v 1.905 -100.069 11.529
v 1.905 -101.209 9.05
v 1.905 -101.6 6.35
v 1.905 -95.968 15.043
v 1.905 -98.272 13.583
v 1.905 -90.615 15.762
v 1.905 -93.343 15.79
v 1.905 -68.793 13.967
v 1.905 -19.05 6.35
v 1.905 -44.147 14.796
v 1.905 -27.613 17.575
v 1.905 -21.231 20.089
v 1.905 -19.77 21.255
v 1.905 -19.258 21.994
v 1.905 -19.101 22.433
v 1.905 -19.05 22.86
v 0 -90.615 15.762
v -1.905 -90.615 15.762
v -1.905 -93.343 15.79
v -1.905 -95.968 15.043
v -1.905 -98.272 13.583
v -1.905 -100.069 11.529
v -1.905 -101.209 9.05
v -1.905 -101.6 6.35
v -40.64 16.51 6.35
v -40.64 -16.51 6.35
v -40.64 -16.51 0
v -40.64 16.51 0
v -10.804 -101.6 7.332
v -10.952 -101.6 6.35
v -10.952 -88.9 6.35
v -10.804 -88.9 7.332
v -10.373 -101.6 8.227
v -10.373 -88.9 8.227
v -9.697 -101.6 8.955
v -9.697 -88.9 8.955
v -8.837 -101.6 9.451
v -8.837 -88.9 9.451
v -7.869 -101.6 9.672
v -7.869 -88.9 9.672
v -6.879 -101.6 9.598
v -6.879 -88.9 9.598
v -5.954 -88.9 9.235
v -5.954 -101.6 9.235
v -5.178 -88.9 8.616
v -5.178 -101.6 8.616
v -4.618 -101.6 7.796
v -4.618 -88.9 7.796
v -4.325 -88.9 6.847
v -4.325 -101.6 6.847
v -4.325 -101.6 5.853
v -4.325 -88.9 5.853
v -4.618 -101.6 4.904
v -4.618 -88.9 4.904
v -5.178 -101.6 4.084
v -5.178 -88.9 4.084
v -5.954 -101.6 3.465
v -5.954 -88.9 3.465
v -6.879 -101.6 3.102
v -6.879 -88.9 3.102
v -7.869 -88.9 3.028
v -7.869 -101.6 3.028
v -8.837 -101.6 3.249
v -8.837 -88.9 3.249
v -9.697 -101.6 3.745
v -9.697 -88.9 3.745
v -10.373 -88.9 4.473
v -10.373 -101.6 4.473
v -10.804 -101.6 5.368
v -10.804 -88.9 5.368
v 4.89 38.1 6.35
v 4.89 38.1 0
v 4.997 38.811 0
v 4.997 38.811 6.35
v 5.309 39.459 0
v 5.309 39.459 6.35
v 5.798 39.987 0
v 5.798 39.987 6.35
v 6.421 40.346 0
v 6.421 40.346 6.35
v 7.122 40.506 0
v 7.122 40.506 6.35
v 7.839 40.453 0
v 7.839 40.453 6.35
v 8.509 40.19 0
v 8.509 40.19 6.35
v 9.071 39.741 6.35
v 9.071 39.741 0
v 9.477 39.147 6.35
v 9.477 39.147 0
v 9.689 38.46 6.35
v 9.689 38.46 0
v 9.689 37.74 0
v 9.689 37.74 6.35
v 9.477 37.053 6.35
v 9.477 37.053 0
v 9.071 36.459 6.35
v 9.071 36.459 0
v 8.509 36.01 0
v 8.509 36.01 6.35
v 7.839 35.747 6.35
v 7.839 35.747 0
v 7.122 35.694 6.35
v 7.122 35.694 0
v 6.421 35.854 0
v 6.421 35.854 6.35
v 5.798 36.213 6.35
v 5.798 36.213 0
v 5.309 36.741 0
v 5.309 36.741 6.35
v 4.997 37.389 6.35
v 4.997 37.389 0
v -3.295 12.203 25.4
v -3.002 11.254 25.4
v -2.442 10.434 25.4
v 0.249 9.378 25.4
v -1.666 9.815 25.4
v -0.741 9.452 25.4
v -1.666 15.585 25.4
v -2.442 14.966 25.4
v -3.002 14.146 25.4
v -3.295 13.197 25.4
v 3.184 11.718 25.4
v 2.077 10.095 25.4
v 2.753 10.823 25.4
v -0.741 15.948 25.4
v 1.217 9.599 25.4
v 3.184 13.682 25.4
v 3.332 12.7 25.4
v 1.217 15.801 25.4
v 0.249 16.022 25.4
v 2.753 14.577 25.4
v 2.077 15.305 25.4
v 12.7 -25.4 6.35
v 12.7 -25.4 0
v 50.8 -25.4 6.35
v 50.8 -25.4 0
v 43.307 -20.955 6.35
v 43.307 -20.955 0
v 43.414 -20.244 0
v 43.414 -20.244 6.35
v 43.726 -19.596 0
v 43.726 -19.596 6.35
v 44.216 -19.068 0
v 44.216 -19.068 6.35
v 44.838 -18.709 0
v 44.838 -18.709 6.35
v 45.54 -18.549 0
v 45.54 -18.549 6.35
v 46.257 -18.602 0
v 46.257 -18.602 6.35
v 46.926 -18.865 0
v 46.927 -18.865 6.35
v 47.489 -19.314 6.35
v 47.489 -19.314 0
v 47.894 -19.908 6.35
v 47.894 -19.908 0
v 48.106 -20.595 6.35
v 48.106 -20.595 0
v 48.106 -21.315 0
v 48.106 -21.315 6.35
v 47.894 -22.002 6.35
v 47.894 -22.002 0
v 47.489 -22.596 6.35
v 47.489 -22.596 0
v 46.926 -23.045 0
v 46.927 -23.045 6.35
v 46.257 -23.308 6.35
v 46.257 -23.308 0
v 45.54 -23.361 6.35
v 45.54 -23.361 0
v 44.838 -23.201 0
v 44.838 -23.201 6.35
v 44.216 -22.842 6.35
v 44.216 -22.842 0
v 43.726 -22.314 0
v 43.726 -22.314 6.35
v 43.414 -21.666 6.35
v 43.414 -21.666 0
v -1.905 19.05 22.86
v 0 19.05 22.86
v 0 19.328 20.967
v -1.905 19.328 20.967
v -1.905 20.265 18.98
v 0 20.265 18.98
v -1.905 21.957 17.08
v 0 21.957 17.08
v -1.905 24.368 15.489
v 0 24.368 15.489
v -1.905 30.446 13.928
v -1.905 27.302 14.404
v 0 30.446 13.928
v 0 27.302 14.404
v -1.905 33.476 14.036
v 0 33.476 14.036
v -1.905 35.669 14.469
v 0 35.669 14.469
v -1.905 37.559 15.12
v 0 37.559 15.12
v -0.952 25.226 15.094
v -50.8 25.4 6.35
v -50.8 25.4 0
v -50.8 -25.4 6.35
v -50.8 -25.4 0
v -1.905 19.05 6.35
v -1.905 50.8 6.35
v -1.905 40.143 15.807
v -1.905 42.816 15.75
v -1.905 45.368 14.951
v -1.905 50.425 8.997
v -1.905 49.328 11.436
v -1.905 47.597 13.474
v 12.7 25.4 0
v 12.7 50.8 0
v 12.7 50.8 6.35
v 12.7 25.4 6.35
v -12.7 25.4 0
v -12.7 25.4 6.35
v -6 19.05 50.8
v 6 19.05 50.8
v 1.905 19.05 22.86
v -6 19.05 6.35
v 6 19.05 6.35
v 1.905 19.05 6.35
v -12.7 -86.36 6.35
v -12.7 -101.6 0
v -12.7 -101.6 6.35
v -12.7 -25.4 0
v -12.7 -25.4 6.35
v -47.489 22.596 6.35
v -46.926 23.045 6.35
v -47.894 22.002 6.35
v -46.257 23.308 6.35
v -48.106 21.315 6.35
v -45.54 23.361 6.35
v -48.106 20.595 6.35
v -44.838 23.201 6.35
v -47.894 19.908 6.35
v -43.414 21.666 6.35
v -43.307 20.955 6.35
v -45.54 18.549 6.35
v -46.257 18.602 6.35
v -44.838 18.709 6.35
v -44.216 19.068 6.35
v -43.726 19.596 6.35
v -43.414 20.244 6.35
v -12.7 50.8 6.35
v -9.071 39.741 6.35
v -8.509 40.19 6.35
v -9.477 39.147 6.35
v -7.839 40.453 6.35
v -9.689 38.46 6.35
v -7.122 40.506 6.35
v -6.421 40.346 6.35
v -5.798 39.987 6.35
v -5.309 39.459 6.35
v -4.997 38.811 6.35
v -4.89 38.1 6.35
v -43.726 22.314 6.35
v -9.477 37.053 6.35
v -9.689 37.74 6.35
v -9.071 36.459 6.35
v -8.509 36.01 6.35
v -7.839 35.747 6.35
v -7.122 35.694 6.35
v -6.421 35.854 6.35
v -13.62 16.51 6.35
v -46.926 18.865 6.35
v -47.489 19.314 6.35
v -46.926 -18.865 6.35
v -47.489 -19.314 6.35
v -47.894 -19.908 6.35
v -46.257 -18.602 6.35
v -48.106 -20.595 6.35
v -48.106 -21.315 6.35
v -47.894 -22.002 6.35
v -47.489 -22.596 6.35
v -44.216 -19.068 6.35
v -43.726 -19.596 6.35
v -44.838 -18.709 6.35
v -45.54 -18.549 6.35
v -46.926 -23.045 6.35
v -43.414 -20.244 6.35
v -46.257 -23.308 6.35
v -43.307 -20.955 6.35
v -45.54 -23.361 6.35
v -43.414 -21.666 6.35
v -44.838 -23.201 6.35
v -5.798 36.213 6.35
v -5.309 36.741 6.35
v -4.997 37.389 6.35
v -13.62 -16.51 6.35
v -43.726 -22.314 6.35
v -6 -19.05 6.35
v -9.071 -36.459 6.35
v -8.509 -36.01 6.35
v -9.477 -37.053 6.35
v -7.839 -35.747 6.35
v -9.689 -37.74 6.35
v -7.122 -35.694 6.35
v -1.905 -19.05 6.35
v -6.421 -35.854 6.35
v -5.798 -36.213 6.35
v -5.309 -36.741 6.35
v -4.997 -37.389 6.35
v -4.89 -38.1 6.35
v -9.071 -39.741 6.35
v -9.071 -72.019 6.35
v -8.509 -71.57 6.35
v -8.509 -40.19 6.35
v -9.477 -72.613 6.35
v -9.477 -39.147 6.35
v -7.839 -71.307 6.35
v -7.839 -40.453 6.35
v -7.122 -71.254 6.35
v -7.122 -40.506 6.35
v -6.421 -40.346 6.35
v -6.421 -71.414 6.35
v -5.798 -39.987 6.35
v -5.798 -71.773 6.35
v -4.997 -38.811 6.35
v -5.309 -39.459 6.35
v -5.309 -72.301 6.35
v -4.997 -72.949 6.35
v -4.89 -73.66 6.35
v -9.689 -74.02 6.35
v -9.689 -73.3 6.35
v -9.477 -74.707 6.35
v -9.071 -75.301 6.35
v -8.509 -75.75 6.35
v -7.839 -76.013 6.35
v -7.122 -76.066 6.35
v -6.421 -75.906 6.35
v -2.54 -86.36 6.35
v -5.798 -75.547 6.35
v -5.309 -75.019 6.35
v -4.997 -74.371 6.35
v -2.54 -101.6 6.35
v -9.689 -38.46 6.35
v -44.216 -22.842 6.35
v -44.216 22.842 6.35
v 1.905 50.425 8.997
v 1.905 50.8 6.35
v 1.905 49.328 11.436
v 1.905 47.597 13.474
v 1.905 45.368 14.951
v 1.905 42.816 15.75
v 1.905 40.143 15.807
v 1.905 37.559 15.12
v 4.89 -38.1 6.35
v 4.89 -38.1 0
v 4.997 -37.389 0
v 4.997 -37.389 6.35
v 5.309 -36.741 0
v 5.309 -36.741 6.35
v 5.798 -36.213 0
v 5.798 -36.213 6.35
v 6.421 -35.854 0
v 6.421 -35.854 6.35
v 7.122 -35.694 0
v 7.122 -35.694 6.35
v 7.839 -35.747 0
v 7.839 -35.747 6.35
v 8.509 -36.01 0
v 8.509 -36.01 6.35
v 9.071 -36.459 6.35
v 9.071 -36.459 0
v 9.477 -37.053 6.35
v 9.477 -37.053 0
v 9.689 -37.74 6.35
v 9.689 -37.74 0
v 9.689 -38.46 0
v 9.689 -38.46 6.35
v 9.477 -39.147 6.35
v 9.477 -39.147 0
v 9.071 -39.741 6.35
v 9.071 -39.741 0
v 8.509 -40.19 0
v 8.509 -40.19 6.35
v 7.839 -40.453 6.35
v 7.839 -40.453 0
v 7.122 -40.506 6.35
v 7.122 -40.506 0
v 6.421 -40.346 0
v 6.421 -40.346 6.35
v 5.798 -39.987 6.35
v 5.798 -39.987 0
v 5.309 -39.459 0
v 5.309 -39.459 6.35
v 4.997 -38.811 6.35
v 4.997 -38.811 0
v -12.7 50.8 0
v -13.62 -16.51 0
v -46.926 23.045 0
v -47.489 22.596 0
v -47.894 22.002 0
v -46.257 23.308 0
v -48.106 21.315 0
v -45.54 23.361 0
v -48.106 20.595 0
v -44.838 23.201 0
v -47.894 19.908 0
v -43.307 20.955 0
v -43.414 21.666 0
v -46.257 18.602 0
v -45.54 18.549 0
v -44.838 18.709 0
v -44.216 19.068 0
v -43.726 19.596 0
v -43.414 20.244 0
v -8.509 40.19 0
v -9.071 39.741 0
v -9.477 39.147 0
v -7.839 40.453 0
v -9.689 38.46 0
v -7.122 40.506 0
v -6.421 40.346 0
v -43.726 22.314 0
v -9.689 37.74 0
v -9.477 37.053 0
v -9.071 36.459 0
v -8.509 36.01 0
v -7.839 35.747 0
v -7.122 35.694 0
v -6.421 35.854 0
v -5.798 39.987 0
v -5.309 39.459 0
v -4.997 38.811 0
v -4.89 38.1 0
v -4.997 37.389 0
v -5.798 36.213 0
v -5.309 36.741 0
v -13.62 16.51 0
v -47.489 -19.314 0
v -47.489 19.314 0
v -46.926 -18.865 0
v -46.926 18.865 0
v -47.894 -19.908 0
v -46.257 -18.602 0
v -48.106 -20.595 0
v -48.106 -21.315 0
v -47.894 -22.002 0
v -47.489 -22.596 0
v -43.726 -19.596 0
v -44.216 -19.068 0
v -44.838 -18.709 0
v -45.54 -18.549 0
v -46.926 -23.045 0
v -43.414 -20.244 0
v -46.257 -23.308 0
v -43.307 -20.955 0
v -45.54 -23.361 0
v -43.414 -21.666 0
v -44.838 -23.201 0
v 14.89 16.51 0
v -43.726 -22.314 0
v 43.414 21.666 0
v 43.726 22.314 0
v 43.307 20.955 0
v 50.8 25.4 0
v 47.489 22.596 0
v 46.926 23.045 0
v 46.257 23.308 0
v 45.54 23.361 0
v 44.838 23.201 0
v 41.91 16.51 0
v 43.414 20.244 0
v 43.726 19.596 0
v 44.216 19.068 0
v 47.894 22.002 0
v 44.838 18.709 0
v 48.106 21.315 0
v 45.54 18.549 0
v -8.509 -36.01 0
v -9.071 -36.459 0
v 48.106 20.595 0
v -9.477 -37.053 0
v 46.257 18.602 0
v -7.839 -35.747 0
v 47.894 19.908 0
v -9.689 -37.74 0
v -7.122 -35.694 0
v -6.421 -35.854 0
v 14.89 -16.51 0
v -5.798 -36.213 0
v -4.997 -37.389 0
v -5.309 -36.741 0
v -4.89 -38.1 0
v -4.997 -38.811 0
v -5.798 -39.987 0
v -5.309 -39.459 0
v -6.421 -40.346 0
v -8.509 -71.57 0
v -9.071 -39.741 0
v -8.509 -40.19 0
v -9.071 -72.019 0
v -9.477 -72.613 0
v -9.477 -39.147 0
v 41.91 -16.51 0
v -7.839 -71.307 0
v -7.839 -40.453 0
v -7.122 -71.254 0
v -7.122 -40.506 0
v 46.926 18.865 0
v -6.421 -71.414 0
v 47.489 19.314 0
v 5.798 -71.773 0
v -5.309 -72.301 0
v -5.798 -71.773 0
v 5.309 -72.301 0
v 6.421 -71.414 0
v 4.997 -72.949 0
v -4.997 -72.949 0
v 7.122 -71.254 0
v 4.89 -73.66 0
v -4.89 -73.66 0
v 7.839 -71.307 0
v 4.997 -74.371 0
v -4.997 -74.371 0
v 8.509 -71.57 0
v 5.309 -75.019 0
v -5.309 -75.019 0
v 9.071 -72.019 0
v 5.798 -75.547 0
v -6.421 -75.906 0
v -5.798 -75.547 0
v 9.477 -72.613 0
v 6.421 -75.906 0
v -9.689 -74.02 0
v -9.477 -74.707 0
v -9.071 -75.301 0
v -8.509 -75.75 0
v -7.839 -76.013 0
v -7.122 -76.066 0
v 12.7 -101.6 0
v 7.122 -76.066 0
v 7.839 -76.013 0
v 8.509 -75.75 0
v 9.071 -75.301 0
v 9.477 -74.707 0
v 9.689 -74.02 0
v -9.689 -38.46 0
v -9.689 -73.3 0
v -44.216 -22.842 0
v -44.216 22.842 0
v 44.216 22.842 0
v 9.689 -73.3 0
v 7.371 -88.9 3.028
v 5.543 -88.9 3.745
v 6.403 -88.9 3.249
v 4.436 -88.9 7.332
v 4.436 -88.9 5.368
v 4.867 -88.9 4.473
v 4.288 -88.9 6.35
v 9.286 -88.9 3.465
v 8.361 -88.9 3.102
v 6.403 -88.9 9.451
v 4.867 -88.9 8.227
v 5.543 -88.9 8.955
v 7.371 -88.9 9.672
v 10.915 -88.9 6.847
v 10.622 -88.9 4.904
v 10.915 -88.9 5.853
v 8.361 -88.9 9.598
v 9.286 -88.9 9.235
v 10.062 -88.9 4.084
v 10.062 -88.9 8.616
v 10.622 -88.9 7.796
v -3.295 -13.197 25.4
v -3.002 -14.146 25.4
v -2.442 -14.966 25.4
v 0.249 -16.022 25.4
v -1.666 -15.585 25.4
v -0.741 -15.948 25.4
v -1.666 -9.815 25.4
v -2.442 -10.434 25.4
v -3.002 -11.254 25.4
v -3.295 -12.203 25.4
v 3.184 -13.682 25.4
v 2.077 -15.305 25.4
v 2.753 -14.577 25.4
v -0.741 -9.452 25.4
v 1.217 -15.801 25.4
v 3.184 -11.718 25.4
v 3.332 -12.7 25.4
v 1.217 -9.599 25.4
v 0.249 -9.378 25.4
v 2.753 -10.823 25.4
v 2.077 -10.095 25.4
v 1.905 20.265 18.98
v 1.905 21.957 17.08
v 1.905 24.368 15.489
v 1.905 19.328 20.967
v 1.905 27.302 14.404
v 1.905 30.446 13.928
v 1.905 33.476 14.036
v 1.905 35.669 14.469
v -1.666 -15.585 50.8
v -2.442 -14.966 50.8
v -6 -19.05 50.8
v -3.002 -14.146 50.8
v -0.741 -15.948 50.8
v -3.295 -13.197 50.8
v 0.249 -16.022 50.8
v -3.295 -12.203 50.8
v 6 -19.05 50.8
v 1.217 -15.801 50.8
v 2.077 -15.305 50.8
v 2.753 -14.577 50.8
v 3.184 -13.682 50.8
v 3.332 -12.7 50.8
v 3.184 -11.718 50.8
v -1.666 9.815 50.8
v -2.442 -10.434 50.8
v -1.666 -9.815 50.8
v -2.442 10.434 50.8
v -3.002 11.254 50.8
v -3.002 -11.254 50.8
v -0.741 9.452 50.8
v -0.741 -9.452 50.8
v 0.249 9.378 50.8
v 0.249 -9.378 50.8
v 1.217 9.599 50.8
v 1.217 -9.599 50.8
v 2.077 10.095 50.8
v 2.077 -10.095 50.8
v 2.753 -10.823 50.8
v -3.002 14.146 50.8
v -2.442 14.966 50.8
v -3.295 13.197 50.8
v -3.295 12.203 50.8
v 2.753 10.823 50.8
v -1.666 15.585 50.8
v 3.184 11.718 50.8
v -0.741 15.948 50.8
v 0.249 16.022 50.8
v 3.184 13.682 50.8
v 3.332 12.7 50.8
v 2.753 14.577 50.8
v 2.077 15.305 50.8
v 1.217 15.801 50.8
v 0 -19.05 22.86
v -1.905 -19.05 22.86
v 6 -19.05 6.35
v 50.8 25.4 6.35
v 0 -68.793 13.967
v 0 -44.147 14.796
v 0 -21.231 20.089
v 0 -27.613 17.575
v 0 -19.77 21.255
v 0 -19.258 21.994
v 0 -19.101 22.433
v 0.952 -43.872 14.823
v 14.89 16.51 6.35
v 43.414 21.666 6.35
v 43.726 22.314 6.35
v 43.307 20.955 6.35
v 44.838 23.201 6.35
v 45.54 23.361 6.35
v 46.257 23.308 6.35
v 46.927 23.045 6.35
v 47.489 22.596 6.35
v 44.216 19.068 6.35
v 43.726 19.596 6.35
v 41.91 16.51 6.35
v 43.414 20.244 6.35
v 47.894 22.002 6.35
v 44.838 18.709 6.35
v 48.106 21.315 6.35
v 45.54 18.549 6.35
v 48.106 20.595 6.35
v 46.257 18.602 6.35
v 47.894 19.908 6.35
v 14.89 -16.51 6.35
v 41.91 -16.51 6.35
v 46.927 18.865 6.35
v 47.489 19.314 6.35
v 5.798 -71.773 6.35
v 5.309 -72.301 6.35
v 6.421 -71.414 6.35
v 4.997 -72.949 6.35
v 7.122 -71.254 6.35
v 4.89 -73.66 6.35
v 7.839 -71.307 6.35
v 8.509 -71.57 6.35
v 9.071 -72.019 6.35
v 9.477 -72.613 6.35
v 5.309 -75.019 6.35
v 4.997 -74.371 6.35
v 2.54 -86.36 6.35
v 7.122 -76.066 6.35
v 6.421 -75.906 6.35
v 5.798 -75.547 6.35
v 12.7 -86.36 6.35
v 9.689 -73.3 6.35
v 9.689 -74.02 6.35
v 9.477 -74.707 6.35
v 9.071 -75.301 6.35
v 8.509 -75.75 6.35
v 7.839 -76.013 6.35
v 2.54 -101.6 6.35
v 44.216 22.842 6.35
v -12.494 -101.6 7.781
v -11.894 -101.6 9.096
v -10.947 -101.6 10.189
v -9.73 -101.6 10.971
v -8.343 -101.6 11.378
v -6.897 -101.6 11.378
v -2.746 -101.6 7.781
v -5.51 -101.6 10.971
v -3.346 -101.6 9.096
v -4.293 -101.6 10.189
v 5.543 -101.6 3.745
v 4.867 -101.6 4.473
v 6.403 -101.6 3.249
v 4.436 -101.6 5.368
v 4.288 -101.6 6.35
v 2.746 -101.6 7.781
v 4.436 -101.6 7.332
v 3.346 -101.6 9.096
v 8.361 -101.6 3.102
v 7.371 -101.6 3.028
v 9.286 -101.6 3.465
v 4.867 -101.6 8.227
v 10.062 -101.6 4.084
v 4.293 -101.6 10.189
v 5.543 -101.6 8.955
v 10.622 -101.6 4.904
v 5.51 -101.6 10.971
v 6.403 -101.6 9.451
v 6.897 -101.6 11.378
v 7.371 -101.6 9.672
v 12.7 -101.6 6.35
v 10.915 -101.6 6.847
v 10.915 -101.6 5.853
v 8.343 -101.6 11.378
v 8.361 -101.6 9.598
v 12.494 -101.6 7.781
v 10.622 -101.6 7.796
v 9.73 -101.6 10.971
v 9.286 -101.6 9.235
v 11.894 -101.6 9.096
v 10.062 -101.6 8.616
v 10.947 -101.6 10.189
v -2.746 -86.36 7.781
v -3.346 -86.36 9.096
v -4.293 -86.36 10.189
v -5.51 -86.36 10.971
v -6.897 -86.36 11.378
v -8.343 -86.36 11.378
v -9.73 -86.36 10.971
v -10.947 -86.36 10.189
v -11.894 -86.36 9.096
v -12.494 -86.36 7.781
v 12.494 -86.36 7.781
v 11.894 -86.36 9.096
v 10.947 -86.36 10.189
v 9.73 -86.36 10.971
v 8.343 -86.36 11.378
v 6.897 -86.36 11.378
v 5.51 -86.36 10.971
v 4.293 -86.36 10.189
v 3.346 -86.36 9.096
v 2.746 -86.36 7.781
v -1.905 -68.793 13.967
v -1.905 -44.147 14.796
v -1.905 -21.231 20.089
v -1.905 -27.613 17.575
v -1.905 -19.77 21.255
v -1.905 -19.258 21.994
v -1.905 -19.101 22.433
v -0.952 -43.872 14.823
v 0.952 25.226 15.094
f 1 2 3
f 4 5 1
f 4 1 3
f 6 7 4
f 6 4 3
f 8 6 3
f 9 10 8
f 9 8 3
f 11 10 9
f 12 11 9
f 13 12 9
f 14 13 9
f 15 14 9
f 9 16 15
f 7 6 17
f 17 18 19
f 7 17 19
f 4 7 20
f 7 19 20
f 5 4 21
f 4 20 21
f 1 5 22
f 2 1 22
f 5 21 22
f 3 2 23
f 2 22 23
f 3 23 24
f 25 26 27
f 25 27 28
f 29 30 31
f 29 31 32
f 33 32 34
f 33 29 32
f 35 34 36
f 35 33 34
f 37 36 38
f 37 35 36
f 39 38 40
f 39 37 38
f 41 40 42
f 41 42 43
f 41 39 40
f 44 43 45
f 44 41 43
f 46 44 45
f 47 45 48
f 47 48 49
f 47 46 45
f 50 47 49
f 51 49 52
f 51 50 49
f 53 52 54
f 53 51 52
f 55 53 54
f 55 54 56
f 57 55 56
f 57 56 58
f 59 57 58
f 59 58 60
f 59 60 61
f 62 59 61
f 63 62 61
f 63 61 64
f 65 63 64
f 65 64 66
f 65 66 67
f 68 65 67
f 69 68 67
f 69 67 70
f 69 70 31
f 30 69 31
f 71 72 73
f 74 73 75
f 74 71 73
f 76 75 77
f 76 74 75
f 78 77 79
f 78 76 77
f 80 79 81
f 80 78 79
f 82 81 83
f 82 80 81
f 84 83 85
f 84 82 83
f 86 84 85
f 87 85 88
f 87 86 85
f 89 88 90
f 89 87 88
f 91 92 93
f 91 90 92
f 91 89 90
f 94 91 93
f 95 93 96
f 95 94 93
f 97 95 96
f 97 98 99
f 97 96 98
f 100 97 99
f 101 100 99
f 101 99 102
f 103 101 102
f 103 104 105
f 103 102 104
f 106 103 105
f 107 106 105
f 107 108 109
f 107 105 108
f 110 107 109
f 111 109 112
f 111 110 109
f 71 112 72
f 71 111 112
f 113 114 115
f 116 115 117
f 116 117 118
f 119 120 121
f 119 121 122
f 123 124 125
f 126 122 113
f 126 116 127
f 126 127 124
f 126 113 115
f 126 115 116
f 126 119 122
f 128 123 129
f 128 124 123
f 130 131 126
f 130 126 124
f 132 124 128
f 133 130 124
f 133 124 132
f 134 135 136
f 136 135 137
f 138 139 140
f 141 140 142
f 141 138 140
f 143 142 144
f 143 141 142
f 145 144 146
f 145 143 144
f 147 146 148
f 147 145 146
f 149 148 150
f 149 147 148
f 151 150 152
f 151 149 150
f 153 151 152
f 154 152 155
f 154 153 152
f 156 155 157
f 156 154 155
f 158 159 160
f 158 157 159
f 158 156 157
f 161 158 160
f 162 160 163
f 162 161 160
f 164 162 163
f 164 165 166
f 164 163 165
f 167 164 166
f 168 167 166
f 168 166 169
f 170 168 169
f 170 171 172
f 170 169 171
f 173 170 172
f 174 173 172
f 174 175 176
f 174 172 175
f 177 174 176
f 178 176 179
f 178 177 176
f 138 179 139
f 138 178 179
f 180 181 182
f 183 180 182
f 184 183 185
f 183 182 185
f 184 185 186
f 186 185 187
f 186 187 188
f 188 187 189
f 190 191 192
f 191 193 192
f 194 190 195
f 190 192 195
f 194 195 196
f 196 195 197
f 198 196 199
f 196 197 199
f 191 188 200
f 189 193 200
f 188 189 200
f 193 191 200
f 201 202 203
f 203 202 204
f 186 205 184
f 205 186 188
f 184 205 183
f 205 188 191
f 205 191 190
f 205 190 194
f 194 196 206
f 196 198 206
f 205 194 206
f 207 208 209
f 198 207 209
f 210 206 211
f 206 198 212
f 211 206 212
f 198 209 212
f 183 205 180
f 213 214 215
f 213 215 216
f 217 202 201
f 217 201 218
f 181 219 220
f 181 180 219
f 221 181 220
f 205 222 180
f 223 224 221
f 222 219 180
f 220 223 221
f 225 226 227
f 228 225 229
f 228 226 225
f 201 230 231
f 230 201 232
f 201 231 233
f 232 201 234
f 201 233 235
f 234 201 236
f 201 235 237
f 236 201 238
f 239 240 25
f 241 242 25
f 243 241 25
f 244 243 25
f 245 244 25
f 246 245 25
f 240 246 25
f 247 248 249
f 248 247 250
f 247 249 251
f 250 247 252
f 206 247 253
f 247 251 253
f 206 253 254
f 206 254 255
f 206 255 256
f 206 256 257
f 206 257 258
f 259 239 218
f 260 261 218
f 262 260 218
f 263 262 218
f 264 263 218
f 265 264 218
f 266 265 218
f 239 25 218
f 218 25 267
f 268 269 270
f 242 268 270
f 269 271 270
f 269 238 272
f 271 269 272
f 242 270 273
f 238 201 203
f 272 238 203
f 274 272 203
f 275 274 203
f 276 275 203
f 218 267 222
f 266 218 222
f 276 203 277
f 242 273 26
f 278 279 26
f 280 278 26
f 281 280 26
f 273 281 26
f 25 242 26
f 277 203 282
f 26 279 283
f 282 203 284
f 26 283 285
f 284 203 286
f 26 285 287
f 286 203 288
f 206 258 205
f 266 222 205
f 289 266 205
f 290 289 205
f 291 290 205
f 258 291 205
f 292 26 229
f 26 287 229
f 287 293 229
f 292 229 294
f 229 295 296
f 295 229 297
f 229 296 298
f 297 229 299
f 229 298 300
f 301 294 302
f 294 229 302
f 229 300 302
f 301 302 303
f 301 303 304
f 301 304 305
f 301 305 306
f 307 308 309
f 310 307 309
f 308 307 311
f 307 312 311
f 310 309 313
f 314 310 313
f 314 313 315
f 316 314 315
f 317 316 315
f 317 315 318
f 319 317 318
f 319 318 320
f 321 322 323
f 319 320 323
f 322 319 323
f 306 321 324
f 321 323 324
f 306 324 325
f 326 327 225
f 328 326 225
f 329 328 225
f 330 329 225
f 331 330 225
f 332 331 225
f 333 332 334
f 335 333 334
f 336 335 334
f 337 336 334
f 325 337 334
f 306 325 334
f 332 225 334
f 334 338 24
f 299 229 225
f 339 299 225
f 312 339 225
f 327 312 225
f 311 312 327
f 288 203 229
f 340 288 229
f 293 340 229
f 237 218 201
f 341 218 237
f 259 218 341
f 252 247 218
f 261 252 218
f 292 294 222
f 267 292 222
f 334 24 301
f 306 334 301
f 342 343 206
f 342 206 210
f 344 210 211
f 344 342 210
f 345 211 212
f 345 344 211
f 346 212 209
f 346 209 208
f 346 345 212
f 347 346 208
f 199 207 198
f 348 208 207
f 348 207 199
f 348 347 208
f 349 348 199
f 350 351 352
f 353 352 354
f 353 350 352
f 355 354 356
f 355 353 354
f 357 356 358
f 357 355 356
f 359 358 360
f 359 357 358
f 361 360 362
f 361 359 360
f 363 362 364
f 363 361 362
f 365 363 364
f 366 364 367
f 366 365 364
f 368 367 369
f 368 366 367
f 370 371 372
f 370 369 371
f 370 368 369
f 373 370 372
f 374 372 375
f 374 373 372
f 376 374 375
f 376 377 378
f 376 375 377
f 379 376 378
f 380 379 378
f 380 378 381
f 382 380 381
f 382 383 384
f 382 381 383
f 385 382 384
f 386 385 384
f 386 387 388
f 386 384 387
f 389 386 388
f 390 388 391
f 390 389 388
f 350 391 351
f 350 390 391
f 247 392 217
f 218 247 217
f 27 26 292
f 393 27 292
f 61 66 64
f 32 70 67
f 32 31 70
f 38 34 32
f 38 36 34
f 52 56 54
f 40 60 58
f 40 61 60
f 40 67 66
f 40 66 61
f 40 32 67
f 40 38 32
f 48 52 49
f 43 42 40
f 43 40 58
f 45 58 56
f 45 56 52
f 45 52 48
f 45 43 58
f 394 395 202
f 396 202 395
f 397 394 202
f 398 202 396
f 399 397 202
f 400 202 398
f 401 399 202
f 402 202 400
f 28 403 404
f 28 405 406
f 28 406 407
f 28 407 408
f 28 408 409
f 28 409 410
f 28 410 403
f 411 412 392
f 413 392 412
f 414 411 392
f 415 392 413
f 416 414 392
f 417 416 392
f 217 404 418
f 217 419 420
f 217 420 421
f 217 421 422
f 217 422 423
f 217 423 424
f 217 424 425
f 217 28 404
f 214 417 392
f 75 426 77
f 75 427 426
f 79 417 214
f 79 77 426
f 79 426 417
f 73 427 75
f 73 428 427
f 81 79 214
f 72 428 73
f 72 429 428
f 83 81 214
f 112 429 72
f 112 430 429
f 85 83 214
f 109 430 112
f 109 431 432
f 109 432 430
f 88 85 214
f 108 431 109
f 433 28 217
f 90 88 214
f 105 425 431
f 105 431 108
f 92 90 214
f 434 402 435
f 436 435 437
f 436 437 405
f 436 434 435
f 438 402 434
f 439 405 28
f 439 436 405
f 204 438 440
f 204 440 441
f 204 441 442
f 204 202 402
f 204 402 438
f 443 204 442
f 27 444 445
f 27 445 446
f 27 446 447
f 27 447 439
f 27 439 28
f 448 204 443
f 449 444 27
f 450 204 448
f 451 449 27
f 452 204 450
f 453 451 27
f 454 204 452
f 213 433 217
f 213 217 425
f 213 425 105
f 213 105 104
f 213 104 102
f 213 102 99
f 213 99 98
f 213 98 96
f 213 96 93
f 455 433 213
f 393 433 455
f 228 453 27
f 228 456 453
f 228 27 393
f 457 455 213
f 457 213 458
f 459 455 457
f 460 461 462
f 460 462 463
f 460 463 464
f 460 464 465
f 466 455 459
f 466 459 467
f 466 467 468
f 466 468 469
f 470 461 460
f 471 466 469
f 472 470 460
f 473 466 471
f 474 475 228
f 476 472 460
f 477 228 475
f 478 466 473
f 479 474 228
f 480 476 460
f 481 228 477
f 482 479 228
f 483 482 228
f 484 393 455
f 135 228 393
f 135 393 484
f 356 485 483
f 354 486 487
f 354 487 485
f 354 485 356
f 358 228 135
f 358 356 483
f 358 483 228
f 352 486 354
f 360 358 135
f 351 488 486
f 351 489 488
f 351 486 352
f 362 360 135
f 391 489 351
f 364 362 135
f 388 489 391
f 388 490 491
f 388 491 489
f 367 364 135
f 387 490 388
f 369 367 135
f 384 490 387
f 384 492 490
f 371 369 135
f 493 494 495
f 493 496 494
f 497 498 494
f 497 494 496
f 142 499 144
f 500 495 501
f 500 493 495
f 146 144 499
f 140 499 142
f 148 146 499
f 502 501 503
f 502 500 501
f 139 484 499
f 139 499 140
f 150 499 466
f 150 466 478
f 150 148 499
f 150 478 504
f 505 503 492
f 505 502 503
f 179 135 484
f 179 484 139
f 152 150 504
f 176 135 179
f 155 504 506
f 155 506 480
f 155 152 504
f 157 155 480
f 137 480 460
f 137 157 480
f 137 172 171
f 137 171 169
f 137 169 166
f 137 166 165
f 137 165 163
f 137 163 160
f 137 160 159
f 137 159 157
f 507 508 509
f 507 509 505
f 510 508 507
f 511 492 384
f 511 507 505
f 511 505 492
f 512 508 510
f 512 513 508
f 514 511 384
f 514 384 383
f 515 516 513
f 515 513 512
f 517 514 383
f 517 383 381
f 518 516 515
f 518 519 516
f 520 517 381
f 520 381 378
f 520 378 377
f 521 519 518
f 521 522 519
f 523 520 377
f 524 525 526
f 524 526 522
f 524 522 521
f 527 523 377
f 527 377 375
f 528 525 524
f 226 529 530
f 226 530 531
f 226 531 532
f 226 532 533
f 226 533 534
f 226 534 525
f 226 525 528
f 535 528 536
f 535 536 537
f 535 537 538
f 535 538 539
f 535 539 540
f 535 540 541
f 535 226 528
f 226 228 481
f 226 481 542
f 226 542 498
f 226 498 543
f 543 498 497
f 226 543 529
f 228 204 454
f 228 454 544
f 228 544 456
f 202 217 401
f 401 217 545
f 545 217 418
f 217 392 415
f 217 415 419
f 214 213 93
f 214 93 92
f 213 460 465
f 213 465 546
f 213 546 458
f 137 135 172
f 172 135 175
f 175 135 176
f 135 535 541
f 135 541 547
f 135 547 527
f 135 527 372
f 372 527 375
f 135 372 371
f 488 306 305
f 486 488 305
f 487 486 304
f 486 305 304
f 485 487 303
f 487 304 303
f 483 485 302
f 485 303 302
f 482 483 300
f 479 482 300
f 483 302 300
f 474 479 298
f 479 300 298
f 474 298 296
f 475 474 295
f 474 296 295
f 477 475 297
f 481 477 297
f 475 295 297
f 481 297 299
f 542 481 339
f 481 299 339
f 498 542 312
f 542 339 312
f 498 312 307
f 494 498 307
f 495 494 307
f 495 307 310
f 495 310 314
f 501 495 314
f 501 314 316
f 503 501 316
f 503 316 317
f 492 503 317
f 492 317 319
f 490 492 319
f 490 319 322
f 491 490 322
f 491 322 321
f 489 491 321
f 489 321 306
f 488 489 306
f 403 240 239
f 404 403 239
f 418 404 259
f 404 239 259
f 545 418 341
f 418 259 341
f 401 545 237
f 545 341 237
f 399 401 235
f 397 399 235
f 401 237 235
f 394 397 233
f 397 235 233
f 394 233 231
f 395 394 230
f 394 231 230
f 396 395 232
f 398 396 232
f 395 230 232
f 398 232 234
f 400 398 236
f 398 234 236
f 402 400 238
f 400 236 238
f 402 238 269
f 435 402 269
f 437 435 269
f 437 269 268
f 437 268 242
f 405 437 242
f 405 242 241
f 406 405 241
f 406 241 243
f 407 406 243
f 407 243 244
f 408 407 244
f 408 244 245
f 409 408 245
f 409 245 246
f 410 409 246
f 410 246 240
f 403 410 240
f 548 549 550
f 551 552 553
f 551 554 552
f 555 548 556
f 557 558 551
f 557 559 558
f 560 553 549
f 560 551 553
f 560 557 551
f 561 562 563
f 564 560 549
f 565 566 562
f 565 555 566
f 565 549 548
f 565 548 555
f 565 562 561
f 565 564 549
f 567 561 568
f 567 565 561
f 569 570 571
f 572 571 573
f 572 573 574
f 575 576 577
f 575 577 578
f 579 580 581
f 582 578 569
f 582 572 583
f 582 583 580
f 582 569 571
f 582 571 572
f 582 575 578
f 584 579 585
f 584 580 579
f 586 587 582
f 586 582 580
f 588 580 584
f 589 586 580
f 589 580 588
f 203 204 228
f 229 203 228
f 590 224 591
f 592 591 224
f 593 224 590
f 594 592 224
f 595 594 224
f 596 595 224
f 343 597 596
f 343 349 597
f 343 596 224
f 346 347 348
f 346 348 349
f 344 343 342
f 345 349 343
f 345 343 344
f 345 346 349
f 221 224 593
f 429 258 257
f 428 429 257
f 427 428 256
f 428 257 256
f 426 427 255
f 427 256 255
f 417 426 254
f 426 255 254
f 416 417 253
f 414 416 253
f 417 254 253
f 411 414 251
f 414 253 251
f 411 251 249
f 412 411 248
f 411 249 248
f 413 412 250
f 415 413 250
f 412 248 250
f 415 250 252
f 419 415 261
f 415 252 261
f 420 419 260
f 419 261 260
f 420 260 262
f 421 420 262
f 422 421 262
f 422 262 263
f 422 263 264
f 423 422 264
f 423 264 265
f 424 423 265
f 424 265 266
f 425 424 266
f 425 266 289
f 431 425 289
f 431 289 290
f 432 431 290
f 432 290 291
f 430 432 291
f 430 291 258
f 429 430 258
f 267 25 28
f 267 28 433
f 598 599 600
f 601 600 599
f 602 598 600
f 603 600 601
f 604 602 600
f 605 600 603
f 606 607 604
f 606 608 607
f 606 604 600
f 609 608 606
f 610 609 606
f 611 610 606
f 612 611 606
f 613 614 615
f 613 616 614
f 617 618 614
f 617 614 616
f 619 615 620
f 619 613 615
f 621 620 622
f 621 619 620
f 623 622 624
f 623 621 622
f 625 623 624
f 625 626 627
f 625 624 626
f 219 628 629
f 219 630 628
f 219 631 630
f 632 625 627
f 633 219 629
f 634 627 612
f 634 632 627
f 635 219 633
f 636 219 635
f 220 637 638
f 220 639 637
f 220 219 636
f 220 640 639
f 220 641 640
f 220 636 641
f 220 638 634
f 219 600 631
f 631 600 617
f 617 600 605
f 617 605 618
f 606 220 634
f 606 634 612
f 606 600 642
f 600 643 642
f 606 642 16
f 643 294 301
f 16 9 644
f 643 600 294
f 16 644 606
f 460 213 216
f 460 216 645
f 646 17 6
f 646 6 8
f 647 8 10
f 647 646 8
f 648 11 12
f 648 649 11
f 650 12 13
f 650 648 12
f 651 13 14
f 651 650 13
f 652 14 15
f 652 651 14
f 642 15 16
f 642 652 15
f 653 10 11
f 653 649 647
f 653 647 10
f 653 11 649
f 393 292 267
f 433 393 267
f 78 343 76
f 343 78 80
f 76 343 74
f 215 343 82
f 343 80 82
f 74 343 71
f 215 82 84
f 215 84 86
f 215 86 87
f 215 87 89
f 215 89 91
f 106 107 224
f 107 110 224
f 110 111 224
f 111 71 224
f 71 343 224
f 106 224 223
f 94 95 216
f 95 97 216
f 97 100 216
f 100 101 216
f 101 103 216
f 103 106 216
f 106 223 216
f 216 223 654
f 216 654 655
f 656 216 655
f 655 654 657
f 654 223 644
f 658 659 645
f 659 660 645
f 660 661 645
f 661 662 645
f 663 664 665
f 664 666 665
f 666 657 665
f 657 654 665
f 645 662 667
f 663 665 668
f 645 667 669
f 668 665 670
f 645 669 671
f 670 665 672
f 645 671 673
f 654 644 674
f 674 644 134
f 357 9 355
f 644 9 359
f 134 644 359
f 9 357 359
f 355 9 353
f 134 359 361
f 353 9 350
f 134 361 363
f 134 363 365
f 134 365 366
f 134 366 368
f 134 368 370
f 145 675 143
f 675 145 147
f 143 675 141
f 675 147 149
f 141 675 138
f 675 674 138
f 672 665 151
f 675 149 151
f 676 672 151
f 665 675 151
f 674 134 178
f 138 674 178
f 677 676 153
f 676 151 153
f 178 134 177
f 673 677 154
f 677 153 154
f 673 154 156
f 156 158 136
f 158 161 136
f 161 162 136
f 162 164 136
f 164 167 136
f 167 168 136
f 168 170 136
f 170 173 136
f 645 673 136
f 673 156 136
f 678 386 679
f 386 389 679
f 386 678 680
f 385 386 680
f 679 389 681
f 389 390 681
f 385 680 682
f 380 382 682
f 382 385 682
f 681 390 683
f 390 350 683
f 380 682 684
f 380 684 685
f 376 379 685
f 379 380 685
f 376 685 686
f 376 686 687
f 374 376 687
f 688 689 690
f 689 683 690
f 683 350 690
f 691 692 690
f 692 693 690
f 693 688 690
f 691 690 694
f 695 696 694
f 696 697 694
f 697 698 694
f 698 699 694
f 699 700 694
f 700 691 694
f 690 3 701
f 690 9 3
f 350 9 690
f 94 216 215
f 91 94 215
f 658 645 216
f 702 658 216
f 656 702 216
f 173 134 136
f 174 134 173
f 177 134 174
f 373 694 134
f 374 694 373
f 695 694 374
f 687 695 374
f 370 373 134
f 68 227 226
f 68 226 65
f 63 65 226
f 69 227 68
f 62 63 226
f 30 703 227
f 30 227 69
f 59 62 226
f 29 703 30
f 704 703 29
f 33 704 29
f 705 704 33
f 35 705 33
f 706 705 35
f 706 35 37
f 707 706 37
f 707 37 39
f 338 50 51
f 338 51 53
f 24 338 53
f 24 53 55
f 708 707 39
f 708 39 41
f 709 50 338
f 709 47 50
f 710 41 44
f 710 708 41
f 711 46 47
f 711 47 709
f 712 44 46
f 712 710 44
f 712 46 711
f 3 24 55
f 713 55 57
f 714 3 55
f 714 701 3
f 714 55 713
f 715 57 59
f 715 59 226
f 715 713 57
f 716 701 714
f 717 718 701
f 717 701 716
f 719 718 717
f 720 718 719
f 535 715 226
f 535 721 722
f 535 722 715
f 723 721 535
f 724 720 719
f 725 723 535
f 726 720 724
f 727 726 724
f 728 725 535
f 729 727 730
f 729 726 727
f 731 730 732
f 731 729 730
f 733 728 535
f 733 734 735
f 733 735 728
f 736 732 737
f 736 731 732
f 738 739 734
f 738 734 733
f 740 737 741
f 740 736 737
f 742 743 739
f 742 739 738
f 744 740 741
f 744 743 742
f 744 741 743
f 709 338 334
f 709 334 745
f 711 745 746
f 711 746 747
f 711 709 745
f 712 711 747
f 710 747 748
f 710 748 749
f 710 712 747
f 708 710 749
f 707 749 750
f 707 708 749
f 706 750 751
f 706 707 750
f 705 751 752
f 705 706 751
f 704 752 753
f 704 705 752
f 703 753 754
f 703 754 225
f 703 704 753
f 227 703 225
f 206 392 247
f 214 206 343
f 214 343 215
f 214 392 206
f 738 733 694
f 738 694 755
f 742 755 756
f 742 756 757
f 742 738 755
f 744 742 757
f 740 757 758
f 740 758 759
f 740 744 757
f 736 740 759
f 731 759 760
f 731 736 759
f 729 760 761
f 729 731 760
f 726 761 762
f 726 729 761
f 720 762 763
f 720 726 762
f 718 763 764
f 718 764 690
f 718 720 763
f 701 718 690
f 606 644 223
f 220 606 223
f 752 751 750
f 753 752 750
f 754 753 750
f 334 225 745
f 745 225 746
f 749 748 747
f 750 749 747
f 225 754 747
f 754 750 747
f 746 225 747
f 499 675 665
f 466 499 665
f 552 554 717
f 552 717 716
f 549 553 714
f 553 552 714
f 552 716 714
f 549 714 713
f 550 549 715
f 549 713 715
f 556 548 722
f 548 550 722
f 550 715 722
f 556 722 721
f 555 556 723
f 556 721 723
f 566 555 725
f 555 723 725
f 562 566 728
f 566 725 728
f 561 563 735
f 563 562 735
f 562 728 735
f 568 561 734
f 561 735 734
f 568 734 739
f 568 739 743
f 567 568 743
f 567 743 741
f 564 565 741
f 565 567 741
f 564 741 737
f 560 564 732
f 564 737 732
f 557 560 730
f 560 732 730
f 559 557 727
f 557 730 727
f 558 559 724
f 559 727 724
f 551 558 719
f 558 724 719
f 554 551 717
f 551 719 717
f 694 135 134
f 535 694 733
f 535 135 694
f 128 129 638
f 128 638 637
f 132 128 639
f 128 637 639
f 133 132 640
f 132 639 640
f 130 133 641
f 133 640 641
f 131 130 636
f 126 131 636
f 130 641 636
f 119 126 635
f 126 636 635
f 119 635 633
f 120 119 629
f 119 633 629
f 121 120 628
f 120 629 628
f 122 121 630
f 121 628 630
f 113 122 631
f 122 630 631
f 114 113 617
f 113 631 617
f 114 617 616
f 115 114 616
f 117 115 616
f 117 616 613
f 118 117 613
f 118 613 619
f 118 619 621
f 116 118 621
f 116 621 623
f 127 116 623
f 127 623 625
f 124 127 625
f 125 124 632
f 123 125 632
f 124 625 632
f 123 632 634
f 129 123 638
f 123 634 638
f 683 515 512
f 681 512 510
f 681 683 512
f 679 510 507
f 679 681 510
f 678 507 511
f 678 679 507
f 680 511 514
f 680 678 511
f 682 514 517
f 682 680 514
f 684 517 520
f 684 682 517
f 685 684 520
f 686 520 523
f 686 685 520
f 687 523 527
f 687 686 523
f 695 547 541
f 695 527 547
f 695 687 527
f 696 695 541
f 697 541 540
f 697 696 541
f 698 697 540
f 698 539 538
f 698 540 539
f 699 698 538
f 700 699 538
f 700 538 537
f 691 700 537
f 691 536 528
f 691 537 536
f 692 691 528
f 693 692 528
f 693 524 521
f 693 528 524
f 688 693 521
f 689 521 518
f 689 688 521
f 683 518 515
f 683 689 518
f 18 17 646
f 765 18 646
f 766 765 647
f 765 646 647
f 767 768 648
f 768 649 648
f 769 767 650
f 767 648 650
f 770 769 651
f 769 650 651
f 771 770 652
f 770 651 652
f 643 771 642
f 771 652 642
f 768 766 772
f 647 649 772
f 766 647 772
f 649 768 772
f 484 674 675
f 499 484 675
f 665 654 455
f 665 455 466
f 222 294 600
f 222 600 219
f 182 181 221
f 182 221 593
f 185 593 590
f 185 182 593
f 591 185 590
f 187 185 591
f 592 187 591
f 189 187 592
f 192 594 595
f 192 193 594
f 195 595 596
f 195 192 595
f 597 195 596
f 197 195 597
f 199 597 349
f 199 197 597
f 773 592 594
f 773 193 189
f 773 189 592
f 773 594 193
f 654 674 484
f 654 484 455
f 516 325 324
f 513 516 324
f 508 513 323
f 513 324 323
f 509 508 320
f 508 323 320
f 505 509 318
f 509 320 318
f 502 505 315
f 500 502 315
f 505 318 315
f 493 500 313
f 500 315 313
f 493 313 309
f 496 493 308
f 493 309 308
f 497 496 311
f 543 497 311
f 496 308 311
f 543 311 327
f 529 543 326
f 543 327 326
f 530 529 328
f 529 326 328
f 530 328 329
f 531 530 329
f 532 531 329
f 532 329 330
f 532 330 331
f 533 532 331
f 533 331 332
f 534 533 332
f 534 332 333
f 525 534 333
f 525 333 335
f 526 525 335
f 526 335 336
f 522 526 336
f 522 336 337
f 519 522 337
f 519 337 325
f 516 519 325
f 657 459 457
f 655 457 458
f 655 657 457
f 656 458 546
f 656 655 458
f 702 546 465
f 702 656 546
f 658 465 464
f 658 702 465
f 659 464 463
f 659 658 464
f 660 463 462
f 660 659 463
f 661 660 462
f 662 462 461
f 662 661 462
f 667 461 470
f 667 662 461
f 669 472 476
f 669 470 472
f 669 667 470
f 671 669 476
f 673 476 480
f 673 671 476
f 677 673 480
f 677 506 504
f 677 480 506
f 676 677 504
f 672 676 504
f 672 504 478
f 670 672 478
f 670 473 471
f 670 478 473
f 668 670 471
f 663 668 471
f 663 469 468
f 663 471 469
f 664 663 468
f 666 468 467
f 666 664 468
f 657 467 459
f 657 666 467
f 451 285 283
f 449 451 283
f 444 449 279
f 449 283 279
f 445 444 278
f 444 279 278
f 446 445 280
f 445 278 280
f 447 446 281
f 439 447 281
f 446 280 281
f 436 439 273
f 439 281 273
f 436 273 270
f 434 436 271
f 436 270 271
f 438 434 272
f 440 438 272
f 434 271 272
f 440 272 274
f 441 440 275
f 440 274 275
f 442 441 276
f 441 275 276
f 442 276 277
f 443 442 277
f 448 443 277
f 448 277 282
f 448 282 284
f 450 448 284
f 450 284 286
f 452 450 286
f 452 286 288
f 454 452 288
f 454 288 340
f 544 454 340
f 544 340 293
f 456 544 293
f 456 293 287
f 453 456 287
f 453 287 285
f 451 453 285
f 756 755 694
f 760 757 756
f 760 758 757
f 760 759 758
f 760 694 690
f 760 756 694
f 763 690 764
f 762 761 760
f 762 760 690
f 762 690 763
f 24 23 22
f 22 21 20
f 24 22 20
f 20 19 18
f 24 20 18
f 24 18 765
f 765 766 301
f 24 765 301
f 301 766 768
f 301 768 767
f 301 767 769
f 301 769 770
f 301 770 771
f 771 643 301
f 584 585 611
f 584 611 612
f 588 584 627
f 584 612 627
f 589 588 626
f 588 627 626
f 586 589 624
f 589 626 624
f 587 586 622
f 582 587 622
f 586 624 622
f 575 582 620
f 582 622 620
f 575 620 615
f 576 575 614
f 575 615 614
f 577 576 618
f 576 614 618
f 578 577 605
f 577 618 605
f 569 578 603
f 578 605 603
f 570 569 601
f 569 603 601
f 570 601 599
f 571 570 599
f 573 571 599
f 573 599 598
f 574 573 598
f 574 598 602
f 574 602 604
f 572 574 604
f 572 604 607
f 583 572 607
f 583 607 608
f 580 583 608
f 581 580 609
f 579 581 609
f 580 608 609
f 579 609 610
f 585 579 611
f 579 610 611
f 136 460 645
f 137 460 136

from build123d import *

# Parameters (mm, degrees)
F0_W      = 12
F0_H      = 38.1
F1_DEPTH  = 50.8
F2_R      = 3.33175
F3_DEPTH  = 25.4
F4_W      = 25.4
F4_H      = 76.2
F4_W_2    = 38.1
F4_H_2    = 50.8
F4_W_3    = 12
F4_H_3    = 38.1
F4_H_4    = 25.4
F5_DEPTH  = 6.35
F7_DEPTH  = 1.905
F8_R      = 3.33175
F9_DEPTH  = 12.7
F10_R     = 5.08
F11_DEPTH = 15.24
F13_DEPTH = 2.54
F14_W     = 27.02
F14_H     = 33.02
F15_DEPTH = 6.351
F16_R     = 2.413
F17_DEPTH = 6.351


# Not quite as in the source:
# - a pattern or mirror of a feature is missing from the dataset's text; its kind, count and spacing are read off the source's solid


with BuildPart() as f1:
    # F0 (on Top) → F1 (new body)
    with BuildSketch(Plane.XY):
        Rectangle(F0_W, F0_H)
    extrude(amount=F1_DEPTH)

    # F2 (on face) → F3 (cut)
    with BuildSketch(Plane.XY.offset(50.8)):
        with Locations((0, 12.7)):
            Circle(F2_R)
        with Locations((0, -12.7)):
            Circle(F2_R)
    extrude(amount=-F3_DEPTH, mode=Mode.SUBTRACT)

    # F4 (on face) → F5 (join)
    with BuildSketch(Plane(origin=(0, 0, 0), x_dir=(1, 0, 0), z_dir=(0, 0, -1))):
        with Locations((0, 63.5)):
            Rectangle(F4_W, F4_H)
        with Locations((31.75, 0)):
            Rectangle(F4_W_2, F4_H_2)
        Rectangle(F4_W, F4_H_2)
        Rectangle(F4_W_3, F4_H_3, mode=Mode.SUBTRACT)
        with Locations((-31.75, 0)):
            Rectangle(F4_W_2, F4_H_2)
        with Locations((0, -38.1)):
            Rectangle(F4_W, F4_H_4)
    extrude(amount=-F5_DEPTH)

    # F6 (on Right) → F7 (join, symmetric)
    with BuildSketch(Plane.YZ):
        with BuildLine():
            Line((-19.05, 6.35), (-19.05, 22.86))
            add(Edge.make_bspline(
                [(-90.6148681487, 15.7624194539), (-19.05, 4.6606890297), (-19.05, 22.86)],
                knots=[4.0563179373, 4.0563179373, 4.0563179373, 6.2831853072, 6.2831853072, 6.2831853072], degree=2, weights=[1, 0.4415833544, 1]))
            ThreePointArc((-90.6148681487, 15.7624194539), (-98.2724942161, 13.5830277507), (-101.6, 6.35))
            Line((-101.6, 6.35), (-25.4, 6.35))
            Line((-25.4, 6.35), (-19.05, 6.35))
        make_face()
        with BuildLine():
            Line((19.05, 22.86), (19.05, 6.35))
            Line((19.05, 6.35), (25.4, 6.35))
            Line((25.4, 6.35), (50.8, 6.35))
            ThreePointArc((50.8, 6.35), (46.5346393393, 14.2911472106), (37.5586731715, 15.1200934946))
            add(Edge.make_bspline(
                [(19.05, 22.86), (19.05, 7.2770438497), (37.5586731715, 15.1200934946)],
                knots=[0, 0, 0, 2.0982208016, 2.0982208016, 2.0982208016], degree=2, weights=[1, 0.4983425099, 1]))
        make_face()
    extrude(amount=F7_DEPTH, both=True)

    # F8 (on face) → F9 (cut)
    with BuildSketch(Plane.XZ.offset(101.6)):
        with Locations((-7.62, 6.35)):
            Circle(F8_R)
        with Locations((7.62, 6.35)):
            Circle(F8_R)
    extrude(amount=-F9_DEPTH, mode=Mode.SUBTRACT)

    # F10 (on face) → F11 (join)
    with BuildSketch(Plane.XZ.offset(101.6)):
        with Locations((-7.62, 6.35)):
            Circle(F10_R)
        with BuildLine():
            ThreePointArc((-4.28825, 6.35), (-7.62, 3.01825), (-10.95175, 6.35))
            ThreePointArc((-10.95175, 6.35), (-7.62, 9.68175), (-4.28825, 6.35))
        make_face(mode=Mode.SUBTRACT)
        with Locations((7.62, 6.35)):
            Circle(F10_R)
        with BuildLine():
            ThreePointArc((10.95175, 6.35), (7.62, 3.01825), (4.28825, 6.35))
            ThreePointArc((4.28825, 6.35), (7.62, 9.68175), (10.95175, 6.35))
        make_face(mode=Mode.SUBTRACT)
    extrude(amount=-F11_DEPTH)

    # F12 (on face) → F13 (join)
    with BuildSketch(Plane(origin=(0, -86.36, 0), x_dir=(-1, 0, 0), z_dir=(0, 1, 0))):
        with BuildLine():
            ThreePointArc((-4.28825, 6.35), (-7.62, 9.68175), (-10.95175, 6.35))
            Line((-10.95175, 6.35), (-4.28825, 6.35))
        make_face()
        with BuildLine():
            ThreePointArc((10.95175, 6.35), (7.62, 9.68175), (4.28825, 6.35))
            Line((4.28825, 6.35), (10.95175, 6.35))
        make_face()
    extrude(amount=-F13_DEPTH)

    # F14 (on face) → F15 (cut, through all)
    with BuildSketch(Plane.XY.offset(6.35)):
        with Locations((-27.13, 0)):
            Rectangle(F14_W, F14_H)
        with Locations((28.4, 0)):
            Rectangle(F14_W, F14_H)
    extrude(amount=-F15_DEPTH, mode=Mode.SUBTRACT)

    # F16 (on face) → F17 (cut, through all)
    with BuildSketch(Plane.XY.offset(6.35)):
        with Locations((-7.3025, -73.66)):
            Circle(F16_R)
        with Locations((-7.3025, -38.1)):
            Circle(F16_R)
        with Locations((-45.72, -20.955)):
            Circle(F16_R)
        with Locations((-45.72, 20.955)):
            Circle(F16_R)
        with Locations((-7.3025, 38.1)):
            Circle(F16_R)
    f17 = extrude(amount=-F17_DEPTH, mode=Mode.SUBTRACT)

    # F17_copies: F17 across plane
    add(f17.mirror(Plane(origin=(0, 0, 0), x_dir=(0, 0, 1), z_dir=(1, 0, 0))), mode=Mode.SUBTRACT)


solid = f1.part
